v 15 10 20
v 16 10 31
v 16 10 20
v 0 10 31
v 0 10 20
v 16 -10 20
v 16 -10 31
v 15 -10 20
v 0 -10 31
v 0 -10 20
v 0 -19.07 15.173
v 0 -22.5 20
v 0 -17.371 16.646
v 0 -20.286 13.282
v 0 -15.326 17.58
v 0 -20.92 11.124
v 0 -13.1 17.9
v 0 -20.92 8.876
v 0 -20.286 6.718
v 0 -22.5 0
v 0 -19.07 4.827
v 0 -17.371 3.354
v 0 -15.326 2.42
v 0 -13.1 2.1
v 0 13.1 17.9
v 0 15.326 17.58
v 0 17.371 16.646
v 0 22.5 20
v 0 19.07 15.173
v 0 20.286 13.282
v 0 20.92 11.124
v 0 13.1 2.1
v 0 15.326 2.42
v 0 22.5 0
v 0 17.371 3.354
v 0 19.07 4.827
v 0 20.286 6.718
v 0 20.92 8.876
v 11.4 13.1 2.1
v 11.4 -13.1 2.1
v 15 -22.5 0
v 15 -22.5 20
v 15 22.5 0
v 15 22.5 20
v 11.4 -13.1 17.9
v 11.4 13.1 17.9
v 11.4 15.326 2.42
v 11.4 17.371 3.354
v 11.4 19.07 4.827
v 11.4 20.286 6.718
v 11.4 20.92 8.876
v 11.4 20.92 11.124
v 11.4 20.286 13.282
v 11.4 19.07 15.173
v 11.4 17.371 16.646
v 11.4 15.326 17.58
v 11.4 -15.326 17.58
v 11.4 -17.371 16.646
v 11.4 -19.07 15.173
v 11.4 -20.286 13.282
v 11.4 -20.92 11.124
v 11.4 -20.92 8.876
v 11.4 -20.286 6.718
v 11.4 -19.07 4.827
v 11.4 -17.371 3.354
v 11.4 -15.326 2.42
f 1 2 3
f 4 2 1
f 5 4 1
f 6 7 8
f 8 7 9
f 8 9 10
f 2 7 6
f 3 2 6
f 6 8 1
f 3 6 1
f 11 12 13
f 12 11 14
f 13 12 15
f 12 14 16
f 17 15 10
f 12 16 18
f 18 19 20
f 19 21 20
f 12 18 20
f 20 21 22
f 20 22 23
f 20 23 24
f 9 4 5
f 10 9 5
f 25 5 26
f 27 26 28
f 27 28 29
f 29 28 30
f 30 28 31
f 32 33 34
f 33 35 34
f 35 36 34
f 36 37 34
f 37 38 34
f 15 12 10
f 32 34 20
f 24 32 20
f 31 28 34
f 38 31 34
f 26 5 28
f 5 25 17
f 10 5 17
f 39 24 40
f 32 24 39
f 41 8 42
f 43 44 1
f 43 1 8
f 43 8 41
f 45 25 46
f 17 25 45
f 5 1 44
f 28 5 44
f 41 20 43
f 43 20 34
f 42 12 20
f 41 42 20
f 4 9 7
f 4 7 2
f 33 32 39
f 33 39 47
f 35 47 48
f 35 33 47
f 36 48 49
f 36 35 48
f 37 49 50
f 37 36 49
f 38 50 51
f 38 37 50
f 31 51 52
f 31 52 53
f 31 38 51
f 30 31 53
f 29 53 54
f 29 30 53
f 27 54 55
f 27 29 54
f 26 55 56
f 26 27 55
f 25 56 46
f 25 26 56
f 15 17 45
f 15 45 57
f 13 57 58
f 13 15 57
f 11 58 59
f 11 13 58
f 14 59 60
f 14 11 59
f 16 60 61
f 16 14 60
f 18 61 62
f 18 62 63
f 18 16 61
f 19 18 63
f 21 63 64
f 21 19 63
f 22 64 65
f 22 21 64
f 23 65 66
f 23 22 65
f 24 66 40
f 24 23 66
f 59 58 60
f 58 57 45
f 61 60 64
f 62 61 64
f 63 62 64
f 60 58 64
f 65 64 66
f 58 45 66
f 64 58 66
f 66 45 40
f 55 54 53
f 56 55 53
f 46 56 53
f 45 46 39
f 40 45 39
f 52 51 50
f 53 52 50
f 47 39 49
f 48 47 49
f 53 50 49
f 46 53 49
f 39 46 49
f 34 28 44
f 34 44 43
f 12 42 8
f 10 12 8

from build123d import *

# Parameters (mm, degrees)
SKETCH_1_W          = 20
SKETCH_1_H          = 45
EXTRUDE_1_DEPTH     = 15
SKETCH_4_W          = 11
SKETCH_4_H          = 20
EXTRUDE_2_DEPTH     = 16
CUT_EXTRUDE_1_DEPTH = 11.4


with BuildPart() as part:
    # 草图1 → 凸台-拉伸1 (new body)
    with BuildSketch(Plane(origin=(0, 0, 0), x_dir=(0, 0, -1), z_dir=(1, 0, 0))):
        with Locations((-10, 0)):
            Rectangle(SKETCH_1_W, SKETCH_1_H)
    extrude(amount=EXTRUDE_1_DEPTH)

    # 草图4 → 凸台-拉伸2 (add)
    with BuildSketch(Plane(origin=(0, 0, 0), x_dir=(0, 0, -1), z_dir=(1, 0, 0))):
        with Locations((-25.5, 0)):
            Rectangle(SKETCH_4_W, SKETCH_4_H)
    extrude(amount=EXTRUDE_2_DEPTH)

    # 草图2 → 切除-拉伸1 (cut)
    with BuildSketch(Plane(origin=(0, 0, 0), x_dir=(0, 0, -1), z_dir=(1, 0, 0))):
        with BuildLine():
            Line((-17.9, 13.1), (-17.9, -13.1))
            ThreePointArc((-17.9, -13.1), (-10, -21), (-2.1, -13.1))
            Line((-2.1, -13.1), (-2.1, 13.1))
            ThreePointArc((-2.1, 13.1), (-10, 21), (-17.9, 13.1))
        make_face()
    extrude(amount=CUT_EXTRUDE_1_DEPTH, mode=Mode.SUBTRACT)


solid = part.part
